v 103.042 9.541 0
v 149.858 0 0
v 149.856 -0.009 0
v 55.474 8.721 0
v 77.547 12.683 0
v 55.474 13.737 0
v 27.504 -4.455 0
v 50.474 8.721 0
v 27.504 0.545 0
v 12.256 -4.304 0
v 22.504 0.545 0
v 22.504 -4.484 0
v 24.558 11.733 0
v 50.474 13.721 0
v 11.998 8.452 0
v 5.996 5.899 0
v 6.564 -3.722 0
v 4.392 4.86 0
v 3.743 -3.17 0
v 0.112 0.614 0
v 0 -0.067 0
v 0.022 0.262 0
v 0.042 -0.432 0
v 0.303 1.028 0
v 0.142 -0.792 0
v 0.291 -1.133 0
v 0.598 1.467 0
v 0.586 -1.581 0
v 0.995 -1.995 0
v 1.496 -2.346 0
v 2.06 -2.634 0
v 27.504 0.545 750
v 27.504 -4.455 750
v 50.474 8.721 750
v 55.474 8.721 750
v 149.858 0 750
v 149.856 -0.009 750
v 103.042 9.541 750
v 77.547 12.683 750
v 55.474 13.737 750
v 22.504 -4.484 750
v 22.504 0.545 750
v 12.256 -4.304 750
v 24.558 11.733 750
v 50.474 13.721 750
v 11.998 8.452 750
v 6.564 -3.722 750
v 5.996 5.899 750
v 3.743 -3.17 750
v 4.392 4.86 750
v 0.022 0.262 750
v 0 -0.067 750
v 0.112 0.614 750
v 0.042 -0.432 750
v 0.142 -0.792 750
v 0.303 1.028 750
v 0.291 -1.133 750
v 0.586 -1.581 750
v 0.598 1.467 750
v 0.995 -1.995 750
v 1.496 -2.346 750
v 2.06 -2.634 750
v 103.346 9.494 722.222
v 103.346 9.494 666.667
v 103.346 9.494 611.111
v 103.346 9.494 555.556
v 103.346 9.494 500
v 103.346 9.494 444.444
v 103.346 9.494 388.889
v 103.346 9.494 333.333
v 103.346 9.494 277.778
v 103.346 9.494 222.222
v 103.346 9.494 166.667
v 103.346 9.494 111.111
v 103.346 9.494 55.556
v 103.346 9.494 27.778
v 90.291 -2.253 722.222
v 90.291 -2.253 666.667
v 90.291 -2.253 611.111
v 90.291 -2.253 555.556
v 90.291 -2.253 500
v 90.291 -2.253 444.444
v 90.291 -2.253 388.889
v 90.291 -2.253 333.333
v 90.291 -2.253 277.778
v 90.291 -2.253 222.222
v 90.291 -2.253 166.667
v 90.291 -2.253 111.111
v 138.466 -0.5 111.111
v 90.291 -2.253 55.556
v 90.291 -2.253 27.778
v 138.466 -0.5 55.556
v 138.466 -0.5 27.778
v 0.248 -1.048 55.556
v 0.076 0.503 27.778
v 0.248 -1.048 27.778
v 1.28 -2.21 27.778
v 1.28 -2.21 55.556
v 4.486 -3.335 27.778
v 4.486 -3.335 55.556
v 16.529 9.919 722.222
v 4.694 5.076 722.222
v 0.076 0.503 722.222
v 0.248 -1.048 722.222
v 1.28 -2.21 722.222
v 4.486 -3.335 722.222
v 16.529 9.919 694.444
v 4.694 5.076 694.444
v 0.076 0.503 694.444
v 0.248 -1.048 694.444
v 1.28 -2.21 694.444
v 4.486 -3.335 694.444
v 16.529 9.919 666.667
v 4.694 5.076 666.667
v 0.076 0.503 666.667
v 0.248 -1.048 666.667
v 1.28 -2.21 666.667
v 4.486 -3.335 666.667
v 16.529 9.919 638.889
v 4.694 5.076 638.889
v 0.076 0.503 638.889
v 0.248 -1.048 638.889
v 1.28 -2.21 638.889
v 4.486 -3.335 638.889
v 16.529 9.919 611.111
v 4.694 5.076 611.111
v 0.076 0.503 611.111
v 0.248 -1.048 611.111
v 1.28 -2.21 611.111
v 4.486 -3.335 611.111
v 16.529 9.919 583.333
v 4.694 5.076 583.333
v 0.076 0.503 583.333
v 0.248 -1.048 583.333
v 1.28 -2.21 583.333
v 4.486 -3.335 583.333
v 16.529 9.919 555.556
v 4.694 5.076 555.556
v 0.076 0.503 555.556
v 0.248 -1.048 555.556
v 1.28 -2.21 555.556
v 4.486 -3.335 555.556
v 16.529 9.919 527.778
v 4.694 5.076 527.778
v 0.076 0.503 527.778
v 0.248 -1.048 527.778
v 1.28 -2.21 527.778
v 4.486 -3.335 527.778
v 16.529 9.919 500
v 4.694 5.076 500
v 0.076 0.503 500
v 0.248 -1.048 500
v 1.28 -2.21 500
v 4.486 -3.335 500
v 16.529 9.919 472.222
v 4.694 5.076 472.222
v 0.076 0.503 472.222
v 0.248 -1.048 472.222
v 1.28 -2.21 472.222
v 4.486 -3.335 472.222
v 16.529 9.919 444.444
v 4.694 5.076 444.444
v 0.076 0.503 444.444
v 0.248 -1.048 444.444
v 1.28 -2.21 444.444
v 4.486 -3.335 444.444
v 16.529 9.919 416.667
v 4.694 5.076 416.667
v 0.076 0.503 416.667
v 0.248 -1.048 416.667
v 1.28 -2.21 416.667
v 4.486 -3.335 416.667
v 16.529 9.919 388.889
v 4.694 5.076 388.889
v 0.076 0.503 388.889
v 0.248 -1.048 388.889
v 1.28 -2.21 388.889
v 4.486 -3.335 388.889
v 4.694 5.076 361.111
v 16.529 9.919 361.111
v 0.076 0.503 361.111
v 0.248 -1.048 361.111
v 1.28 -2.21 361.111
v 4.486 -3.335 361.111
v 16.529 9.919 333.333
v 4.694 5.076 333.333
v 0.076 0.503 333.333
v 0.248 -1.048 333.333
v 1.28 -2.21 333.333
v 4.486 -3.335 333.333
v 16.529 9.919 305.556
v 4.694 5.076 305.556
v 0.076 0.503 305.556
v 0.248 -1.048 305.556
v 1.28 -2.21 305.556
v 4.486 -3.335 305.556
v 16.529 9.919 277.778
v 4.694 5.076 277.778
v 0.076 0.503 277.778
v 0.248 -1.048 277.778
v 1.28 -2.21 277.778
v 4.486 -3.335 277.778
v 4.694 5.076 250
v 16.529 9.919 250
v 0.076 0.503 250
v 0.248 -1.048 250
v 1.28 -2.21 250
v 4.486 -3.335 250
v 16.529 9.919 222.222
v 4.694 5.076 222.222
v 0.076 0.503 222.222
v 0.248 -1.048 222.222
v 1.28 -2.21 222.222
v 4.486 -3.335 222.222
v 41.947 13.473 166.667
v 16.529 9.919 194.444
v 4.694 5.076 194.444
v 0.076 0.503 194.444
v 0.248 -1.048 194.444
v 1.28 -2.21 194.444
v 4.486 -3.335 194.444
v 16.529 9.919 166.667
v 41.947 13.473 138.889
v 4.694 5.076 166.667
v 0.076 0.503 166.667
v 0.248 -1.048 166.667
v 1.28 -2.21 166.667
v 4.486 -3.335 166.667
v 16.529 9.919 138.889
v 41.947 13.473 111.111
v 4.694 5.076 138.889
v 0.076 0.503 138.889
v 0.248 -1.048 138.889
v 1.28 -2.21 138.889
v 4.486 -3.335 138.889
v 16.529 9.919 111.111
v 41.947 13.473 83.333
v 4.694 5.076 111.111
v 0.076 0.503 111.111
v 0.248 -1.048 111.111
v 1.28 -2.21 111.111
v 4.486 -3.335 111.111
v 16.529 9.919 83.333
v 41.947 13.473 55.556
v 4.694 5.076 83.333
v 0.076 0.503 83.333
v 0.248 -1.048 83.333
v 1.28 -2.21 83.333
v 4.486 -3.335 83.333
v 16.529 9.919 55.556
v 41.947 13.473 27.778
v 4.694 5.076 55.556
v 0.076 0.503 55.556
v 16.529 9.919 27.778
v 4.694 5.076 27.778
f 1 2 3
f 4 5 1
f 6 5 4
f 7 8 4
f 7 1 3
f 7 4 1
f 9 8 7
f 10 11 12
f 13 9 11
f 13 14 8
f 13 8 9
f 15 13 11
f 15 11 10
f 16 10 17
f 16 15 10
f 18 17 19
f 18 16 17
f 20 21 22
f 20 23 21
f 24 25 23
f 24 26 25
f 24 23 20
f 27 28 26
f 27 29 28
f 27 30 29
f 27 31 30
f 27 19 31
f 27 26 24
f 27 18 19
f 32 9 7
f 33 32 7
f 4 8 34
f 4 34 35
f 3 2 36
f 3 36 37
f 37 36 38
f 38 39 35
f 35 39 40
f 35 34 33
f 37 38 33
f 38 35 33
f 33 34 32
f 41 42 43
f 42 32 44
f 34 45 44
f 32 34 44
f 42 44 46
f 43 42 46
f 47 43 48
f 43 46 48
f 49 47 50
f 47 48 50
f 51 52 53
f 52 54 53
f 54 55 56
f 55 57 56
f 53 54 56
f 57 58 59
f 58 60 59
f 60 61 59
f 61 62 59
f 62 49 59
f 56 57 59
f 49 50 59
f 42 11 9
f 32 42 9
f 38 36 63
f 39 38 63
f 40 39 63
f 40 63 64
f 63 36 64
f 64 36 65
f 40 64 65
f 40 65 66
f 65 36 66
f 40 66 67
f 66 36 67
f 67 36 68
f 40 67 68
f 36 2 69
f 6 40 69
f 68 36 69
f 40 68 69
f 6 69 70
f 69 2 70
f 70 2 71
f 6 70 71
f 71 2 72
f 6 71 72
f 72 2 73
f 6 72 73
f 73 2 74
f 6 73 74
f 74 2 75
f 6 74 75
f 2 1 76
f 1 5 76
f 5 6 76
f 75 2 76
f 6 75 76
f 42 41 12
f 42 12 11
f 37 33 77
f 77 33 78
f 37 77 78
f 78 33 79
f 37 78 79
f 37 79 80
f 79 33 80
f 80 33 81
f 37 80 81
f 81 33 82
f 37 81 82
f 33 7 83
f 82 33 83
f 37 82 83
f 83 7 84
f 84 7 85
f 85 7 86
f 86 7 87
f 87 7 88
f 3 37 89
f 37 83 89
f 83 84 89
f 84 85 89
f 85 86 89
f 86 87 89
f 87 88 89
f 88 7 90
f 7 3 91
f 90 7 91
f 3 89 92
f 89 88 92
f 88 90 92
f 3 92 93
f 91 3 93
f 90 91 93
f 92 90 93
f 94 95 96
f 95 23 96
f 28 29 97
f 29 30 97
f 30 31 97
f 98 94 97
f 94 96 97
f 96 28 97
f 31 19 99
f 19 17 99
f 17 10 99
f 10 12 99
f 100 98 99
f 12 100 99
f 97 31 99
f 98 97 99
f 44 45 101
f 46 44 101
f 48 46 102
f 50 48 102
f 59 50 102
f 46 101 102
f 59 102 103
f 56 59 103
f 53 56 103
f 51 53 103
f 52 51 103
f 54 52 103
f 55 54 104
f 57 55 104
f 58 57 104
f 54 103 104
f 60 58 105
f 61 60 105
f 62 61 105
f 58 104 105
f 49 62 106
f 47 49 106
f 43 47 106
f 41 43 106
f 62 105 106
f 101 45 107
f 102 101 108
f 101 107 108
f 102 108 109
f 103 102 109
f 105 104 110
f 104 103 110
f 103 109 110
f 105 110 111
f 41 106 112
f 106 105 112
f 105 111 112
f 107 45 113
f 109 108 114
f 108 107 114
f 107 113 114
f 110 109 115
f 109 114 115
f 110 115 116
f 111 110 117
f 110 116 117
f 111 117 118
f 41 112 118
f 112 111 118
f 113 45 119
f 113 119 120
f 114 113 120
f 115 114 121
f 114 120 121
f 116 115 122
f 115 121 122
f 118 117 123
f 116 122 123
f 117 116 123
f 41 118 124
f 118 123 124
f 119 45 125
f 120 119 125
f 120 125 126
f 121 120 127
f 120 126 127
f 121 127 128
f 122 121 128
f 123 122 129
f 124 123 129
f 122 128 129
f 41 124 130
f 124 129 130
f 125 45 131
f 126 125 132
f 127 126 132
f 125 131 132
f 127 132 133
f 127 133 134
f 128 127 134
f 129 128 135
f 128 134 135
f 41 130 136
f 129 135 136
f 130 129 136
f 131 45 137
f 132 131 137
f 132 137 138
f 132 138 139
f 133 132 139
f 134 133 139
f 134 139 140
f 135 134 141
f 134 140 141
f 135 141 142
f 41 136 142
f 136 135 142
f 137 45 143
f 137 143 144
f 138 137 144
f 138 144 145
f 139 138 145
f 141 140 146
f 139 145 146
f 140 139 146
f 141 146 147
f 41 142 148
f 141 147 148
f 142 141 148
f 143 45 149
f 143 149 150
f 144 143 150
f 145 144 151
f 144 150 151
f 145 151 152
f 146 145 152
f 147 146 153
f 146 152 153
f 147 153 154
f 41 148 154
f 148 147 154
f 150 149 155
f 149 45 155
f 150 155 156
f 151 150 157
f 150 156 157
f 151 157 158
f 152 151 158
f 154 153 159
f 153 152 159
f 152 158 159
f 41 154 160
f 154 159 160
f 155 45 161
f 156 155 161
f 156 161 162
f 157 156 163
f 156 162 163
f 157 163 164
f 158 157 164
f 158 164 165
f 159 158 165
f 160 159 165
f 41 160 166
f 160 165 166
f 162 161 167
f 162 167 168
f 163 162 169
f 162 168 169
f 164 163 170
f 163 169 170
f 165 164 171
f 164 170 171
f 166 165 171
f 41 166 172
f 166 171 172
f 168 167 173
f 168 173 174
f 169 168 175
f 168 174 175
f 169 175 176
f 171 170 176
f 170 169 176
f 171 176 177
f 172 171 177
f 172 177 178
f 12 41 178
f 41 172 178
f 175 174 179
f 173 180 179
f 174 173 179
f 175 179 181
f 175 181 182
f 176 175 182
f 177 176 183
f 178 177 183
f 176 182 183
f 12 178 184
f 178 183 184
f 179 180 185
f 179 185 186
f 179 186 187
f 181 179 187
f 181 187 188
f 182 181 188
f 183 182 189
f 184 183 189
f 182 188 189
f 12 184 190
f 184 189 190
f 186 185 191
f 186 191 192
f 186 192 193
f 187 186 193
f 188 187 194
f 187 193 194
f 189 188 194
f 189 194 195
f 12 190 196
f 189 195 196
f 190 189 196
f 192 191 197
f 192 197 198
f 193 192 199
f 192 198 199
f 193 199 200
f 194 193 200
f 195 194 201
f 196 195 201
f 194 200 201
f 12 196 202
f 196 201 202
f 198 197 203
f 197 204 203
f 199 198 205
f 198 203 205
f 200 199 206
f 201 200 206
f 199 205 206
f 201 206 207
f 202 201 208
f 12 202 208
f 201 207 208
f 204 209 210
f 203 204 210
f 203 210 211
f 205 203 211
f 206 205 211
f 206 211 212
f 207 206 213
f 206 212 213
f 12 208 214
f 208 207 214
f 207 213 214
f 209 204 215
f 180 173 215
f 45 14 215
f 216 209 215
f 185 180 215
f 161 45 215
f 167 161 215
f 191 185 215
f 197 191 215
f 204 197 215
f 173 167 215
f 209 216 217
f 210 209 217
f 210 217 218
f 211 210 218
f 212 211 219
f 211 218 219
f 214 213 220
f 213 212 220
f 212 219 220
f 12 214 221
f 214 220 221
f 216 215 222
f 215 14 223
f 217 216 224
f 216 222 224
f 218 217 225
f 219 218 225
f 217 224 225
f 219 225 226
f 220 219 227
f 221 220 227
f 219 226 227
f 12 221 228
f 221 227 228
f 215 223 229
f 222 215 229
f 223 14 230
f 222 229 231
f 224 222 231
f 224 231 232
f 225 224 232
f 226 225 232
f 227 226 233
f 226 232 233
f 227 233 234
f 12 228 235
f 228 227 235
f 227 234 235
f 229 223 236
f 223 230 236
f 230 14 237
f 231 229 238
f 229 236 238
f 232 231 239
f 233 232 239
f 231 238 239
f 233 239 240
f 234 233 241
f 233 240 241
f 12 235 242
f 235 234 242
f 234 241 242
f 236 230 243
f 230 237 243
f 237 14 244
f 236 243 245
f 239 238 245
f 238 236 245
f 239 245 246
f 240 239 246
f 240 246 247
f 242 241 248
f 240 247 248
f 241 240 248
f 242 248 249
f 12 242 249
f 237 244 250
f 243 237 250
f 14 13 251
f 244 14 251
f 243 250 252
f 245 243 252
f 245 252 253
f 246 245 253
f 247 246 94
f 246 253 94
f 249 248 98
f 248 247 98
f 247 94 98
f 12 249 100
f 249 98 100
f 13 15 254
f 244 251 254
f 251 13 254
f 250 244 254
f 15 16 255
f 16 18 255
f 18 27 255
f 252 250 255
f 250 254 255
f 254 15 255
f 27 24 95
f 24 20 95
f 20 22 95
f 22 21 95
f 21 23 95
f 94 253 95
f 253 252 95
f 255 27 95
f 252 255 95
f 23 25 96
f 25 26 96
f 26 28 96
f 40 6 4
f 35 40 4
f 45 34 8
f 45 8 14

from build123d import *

# Parameters (mm, degrees)
BOSS_EXTRUDE1_DEPTH = 750
CUT_EXTRUDE1_DEPTH  = 792


with BuildPart() as part:
    # Sketch1 → Boss-Extrude1 (new body)
    with BuildSketch(Plane.XY):
        with BuildLine():
            Line((149.858113324, 0), (149.855835651, -0.00867133))
            add(Edge.make_bspline(
                [(149.858113324, 0), (148.064864637, 0.471027481), (143.224769961, 1.742362118), (133.175670914, 3.886034627), (119.499496989, 6.758253215), (102.541429982, 9.744438365), (85.964517719, 11.956268792), (70.816843468, 13.313775138), (56.667826786, 13.848112216), (41.764744871, 13.642732387), (27.878301368, 12.538757837), (17.516862727, 10.350224421), (10.936048166, 8.121191966), (5.628206266, 6.017279046), (2.240759138, 3.159947775), (-0.293696922, 0.719700584), (0.542306535, -2.400763115), (4.956625023, -3.537663372), (10.612229447, -4.327824942), (18.770818109, -4.498199411), (30.500536827, -4.493359859), (45.784466548, -3.912234803), (66.370760986, -3.122790256), (87.01625275, -2.378102064), (108.487999193, -1.576150156), (124.547177916, -1.002761448), (137.784916862, -0.521876849), (145.122318881, -0.266429976), (148.916898874, -0.059994798), (149.855835651, -0.00867133)],
                knots=[0, 0, 0, 0, 0.018163138, 0.049023492, 0.100643645, 0.155079573, 0.217678279, 0.264435784, 0.304025298, 0.356345356, 0.410393025, 0.44030719, 0.459595641, 0.478843318, 0.494821298, 0.504998978, 0.508601056, 0.524256235, 0.542615557, 0.567476747, 0.602874089, 0.658123072, 0.717036036, 0.804816302, 0.860486783, 0.927555311, 0.962250043, 0.990268591, 0.999481252, 0.999481252, 0.999481252, 0.999481252], degree=3))
        make_face()
    extrude(amount=BOSS_EXTRUDE1_DEPTH)

    # Sketch2 → Cut-Extrude1 (cut)
    with BuildSketch(Plane(origin=(0, 0, 0), x_dir=(-1, 0, 0), z_dir=(0, 0, -1))):
        Polygon((-22.50427157, -4.484133504), (-22.50427157, 0.545272615), (-27.50427157, 0.545272615), (-27.50427157, -4.454727385), (-27.50427157, -6.853720537), (-22.50427157, -6.853720537), align=None)
        Polygon((-50.473830582, 13.72149366), (-50.473830582, 8.72149366), (-55.473830582, 8.72149366), (-55.473830582, 13.736673966), (-55.473830582, 14.869787579), (-50.473830582, 14.869787579), align=None)
    extrude(amount=-CUT_EXTRUDE1_DEPTH, mode=Mode.SUBTRACT)


solid = part.part
